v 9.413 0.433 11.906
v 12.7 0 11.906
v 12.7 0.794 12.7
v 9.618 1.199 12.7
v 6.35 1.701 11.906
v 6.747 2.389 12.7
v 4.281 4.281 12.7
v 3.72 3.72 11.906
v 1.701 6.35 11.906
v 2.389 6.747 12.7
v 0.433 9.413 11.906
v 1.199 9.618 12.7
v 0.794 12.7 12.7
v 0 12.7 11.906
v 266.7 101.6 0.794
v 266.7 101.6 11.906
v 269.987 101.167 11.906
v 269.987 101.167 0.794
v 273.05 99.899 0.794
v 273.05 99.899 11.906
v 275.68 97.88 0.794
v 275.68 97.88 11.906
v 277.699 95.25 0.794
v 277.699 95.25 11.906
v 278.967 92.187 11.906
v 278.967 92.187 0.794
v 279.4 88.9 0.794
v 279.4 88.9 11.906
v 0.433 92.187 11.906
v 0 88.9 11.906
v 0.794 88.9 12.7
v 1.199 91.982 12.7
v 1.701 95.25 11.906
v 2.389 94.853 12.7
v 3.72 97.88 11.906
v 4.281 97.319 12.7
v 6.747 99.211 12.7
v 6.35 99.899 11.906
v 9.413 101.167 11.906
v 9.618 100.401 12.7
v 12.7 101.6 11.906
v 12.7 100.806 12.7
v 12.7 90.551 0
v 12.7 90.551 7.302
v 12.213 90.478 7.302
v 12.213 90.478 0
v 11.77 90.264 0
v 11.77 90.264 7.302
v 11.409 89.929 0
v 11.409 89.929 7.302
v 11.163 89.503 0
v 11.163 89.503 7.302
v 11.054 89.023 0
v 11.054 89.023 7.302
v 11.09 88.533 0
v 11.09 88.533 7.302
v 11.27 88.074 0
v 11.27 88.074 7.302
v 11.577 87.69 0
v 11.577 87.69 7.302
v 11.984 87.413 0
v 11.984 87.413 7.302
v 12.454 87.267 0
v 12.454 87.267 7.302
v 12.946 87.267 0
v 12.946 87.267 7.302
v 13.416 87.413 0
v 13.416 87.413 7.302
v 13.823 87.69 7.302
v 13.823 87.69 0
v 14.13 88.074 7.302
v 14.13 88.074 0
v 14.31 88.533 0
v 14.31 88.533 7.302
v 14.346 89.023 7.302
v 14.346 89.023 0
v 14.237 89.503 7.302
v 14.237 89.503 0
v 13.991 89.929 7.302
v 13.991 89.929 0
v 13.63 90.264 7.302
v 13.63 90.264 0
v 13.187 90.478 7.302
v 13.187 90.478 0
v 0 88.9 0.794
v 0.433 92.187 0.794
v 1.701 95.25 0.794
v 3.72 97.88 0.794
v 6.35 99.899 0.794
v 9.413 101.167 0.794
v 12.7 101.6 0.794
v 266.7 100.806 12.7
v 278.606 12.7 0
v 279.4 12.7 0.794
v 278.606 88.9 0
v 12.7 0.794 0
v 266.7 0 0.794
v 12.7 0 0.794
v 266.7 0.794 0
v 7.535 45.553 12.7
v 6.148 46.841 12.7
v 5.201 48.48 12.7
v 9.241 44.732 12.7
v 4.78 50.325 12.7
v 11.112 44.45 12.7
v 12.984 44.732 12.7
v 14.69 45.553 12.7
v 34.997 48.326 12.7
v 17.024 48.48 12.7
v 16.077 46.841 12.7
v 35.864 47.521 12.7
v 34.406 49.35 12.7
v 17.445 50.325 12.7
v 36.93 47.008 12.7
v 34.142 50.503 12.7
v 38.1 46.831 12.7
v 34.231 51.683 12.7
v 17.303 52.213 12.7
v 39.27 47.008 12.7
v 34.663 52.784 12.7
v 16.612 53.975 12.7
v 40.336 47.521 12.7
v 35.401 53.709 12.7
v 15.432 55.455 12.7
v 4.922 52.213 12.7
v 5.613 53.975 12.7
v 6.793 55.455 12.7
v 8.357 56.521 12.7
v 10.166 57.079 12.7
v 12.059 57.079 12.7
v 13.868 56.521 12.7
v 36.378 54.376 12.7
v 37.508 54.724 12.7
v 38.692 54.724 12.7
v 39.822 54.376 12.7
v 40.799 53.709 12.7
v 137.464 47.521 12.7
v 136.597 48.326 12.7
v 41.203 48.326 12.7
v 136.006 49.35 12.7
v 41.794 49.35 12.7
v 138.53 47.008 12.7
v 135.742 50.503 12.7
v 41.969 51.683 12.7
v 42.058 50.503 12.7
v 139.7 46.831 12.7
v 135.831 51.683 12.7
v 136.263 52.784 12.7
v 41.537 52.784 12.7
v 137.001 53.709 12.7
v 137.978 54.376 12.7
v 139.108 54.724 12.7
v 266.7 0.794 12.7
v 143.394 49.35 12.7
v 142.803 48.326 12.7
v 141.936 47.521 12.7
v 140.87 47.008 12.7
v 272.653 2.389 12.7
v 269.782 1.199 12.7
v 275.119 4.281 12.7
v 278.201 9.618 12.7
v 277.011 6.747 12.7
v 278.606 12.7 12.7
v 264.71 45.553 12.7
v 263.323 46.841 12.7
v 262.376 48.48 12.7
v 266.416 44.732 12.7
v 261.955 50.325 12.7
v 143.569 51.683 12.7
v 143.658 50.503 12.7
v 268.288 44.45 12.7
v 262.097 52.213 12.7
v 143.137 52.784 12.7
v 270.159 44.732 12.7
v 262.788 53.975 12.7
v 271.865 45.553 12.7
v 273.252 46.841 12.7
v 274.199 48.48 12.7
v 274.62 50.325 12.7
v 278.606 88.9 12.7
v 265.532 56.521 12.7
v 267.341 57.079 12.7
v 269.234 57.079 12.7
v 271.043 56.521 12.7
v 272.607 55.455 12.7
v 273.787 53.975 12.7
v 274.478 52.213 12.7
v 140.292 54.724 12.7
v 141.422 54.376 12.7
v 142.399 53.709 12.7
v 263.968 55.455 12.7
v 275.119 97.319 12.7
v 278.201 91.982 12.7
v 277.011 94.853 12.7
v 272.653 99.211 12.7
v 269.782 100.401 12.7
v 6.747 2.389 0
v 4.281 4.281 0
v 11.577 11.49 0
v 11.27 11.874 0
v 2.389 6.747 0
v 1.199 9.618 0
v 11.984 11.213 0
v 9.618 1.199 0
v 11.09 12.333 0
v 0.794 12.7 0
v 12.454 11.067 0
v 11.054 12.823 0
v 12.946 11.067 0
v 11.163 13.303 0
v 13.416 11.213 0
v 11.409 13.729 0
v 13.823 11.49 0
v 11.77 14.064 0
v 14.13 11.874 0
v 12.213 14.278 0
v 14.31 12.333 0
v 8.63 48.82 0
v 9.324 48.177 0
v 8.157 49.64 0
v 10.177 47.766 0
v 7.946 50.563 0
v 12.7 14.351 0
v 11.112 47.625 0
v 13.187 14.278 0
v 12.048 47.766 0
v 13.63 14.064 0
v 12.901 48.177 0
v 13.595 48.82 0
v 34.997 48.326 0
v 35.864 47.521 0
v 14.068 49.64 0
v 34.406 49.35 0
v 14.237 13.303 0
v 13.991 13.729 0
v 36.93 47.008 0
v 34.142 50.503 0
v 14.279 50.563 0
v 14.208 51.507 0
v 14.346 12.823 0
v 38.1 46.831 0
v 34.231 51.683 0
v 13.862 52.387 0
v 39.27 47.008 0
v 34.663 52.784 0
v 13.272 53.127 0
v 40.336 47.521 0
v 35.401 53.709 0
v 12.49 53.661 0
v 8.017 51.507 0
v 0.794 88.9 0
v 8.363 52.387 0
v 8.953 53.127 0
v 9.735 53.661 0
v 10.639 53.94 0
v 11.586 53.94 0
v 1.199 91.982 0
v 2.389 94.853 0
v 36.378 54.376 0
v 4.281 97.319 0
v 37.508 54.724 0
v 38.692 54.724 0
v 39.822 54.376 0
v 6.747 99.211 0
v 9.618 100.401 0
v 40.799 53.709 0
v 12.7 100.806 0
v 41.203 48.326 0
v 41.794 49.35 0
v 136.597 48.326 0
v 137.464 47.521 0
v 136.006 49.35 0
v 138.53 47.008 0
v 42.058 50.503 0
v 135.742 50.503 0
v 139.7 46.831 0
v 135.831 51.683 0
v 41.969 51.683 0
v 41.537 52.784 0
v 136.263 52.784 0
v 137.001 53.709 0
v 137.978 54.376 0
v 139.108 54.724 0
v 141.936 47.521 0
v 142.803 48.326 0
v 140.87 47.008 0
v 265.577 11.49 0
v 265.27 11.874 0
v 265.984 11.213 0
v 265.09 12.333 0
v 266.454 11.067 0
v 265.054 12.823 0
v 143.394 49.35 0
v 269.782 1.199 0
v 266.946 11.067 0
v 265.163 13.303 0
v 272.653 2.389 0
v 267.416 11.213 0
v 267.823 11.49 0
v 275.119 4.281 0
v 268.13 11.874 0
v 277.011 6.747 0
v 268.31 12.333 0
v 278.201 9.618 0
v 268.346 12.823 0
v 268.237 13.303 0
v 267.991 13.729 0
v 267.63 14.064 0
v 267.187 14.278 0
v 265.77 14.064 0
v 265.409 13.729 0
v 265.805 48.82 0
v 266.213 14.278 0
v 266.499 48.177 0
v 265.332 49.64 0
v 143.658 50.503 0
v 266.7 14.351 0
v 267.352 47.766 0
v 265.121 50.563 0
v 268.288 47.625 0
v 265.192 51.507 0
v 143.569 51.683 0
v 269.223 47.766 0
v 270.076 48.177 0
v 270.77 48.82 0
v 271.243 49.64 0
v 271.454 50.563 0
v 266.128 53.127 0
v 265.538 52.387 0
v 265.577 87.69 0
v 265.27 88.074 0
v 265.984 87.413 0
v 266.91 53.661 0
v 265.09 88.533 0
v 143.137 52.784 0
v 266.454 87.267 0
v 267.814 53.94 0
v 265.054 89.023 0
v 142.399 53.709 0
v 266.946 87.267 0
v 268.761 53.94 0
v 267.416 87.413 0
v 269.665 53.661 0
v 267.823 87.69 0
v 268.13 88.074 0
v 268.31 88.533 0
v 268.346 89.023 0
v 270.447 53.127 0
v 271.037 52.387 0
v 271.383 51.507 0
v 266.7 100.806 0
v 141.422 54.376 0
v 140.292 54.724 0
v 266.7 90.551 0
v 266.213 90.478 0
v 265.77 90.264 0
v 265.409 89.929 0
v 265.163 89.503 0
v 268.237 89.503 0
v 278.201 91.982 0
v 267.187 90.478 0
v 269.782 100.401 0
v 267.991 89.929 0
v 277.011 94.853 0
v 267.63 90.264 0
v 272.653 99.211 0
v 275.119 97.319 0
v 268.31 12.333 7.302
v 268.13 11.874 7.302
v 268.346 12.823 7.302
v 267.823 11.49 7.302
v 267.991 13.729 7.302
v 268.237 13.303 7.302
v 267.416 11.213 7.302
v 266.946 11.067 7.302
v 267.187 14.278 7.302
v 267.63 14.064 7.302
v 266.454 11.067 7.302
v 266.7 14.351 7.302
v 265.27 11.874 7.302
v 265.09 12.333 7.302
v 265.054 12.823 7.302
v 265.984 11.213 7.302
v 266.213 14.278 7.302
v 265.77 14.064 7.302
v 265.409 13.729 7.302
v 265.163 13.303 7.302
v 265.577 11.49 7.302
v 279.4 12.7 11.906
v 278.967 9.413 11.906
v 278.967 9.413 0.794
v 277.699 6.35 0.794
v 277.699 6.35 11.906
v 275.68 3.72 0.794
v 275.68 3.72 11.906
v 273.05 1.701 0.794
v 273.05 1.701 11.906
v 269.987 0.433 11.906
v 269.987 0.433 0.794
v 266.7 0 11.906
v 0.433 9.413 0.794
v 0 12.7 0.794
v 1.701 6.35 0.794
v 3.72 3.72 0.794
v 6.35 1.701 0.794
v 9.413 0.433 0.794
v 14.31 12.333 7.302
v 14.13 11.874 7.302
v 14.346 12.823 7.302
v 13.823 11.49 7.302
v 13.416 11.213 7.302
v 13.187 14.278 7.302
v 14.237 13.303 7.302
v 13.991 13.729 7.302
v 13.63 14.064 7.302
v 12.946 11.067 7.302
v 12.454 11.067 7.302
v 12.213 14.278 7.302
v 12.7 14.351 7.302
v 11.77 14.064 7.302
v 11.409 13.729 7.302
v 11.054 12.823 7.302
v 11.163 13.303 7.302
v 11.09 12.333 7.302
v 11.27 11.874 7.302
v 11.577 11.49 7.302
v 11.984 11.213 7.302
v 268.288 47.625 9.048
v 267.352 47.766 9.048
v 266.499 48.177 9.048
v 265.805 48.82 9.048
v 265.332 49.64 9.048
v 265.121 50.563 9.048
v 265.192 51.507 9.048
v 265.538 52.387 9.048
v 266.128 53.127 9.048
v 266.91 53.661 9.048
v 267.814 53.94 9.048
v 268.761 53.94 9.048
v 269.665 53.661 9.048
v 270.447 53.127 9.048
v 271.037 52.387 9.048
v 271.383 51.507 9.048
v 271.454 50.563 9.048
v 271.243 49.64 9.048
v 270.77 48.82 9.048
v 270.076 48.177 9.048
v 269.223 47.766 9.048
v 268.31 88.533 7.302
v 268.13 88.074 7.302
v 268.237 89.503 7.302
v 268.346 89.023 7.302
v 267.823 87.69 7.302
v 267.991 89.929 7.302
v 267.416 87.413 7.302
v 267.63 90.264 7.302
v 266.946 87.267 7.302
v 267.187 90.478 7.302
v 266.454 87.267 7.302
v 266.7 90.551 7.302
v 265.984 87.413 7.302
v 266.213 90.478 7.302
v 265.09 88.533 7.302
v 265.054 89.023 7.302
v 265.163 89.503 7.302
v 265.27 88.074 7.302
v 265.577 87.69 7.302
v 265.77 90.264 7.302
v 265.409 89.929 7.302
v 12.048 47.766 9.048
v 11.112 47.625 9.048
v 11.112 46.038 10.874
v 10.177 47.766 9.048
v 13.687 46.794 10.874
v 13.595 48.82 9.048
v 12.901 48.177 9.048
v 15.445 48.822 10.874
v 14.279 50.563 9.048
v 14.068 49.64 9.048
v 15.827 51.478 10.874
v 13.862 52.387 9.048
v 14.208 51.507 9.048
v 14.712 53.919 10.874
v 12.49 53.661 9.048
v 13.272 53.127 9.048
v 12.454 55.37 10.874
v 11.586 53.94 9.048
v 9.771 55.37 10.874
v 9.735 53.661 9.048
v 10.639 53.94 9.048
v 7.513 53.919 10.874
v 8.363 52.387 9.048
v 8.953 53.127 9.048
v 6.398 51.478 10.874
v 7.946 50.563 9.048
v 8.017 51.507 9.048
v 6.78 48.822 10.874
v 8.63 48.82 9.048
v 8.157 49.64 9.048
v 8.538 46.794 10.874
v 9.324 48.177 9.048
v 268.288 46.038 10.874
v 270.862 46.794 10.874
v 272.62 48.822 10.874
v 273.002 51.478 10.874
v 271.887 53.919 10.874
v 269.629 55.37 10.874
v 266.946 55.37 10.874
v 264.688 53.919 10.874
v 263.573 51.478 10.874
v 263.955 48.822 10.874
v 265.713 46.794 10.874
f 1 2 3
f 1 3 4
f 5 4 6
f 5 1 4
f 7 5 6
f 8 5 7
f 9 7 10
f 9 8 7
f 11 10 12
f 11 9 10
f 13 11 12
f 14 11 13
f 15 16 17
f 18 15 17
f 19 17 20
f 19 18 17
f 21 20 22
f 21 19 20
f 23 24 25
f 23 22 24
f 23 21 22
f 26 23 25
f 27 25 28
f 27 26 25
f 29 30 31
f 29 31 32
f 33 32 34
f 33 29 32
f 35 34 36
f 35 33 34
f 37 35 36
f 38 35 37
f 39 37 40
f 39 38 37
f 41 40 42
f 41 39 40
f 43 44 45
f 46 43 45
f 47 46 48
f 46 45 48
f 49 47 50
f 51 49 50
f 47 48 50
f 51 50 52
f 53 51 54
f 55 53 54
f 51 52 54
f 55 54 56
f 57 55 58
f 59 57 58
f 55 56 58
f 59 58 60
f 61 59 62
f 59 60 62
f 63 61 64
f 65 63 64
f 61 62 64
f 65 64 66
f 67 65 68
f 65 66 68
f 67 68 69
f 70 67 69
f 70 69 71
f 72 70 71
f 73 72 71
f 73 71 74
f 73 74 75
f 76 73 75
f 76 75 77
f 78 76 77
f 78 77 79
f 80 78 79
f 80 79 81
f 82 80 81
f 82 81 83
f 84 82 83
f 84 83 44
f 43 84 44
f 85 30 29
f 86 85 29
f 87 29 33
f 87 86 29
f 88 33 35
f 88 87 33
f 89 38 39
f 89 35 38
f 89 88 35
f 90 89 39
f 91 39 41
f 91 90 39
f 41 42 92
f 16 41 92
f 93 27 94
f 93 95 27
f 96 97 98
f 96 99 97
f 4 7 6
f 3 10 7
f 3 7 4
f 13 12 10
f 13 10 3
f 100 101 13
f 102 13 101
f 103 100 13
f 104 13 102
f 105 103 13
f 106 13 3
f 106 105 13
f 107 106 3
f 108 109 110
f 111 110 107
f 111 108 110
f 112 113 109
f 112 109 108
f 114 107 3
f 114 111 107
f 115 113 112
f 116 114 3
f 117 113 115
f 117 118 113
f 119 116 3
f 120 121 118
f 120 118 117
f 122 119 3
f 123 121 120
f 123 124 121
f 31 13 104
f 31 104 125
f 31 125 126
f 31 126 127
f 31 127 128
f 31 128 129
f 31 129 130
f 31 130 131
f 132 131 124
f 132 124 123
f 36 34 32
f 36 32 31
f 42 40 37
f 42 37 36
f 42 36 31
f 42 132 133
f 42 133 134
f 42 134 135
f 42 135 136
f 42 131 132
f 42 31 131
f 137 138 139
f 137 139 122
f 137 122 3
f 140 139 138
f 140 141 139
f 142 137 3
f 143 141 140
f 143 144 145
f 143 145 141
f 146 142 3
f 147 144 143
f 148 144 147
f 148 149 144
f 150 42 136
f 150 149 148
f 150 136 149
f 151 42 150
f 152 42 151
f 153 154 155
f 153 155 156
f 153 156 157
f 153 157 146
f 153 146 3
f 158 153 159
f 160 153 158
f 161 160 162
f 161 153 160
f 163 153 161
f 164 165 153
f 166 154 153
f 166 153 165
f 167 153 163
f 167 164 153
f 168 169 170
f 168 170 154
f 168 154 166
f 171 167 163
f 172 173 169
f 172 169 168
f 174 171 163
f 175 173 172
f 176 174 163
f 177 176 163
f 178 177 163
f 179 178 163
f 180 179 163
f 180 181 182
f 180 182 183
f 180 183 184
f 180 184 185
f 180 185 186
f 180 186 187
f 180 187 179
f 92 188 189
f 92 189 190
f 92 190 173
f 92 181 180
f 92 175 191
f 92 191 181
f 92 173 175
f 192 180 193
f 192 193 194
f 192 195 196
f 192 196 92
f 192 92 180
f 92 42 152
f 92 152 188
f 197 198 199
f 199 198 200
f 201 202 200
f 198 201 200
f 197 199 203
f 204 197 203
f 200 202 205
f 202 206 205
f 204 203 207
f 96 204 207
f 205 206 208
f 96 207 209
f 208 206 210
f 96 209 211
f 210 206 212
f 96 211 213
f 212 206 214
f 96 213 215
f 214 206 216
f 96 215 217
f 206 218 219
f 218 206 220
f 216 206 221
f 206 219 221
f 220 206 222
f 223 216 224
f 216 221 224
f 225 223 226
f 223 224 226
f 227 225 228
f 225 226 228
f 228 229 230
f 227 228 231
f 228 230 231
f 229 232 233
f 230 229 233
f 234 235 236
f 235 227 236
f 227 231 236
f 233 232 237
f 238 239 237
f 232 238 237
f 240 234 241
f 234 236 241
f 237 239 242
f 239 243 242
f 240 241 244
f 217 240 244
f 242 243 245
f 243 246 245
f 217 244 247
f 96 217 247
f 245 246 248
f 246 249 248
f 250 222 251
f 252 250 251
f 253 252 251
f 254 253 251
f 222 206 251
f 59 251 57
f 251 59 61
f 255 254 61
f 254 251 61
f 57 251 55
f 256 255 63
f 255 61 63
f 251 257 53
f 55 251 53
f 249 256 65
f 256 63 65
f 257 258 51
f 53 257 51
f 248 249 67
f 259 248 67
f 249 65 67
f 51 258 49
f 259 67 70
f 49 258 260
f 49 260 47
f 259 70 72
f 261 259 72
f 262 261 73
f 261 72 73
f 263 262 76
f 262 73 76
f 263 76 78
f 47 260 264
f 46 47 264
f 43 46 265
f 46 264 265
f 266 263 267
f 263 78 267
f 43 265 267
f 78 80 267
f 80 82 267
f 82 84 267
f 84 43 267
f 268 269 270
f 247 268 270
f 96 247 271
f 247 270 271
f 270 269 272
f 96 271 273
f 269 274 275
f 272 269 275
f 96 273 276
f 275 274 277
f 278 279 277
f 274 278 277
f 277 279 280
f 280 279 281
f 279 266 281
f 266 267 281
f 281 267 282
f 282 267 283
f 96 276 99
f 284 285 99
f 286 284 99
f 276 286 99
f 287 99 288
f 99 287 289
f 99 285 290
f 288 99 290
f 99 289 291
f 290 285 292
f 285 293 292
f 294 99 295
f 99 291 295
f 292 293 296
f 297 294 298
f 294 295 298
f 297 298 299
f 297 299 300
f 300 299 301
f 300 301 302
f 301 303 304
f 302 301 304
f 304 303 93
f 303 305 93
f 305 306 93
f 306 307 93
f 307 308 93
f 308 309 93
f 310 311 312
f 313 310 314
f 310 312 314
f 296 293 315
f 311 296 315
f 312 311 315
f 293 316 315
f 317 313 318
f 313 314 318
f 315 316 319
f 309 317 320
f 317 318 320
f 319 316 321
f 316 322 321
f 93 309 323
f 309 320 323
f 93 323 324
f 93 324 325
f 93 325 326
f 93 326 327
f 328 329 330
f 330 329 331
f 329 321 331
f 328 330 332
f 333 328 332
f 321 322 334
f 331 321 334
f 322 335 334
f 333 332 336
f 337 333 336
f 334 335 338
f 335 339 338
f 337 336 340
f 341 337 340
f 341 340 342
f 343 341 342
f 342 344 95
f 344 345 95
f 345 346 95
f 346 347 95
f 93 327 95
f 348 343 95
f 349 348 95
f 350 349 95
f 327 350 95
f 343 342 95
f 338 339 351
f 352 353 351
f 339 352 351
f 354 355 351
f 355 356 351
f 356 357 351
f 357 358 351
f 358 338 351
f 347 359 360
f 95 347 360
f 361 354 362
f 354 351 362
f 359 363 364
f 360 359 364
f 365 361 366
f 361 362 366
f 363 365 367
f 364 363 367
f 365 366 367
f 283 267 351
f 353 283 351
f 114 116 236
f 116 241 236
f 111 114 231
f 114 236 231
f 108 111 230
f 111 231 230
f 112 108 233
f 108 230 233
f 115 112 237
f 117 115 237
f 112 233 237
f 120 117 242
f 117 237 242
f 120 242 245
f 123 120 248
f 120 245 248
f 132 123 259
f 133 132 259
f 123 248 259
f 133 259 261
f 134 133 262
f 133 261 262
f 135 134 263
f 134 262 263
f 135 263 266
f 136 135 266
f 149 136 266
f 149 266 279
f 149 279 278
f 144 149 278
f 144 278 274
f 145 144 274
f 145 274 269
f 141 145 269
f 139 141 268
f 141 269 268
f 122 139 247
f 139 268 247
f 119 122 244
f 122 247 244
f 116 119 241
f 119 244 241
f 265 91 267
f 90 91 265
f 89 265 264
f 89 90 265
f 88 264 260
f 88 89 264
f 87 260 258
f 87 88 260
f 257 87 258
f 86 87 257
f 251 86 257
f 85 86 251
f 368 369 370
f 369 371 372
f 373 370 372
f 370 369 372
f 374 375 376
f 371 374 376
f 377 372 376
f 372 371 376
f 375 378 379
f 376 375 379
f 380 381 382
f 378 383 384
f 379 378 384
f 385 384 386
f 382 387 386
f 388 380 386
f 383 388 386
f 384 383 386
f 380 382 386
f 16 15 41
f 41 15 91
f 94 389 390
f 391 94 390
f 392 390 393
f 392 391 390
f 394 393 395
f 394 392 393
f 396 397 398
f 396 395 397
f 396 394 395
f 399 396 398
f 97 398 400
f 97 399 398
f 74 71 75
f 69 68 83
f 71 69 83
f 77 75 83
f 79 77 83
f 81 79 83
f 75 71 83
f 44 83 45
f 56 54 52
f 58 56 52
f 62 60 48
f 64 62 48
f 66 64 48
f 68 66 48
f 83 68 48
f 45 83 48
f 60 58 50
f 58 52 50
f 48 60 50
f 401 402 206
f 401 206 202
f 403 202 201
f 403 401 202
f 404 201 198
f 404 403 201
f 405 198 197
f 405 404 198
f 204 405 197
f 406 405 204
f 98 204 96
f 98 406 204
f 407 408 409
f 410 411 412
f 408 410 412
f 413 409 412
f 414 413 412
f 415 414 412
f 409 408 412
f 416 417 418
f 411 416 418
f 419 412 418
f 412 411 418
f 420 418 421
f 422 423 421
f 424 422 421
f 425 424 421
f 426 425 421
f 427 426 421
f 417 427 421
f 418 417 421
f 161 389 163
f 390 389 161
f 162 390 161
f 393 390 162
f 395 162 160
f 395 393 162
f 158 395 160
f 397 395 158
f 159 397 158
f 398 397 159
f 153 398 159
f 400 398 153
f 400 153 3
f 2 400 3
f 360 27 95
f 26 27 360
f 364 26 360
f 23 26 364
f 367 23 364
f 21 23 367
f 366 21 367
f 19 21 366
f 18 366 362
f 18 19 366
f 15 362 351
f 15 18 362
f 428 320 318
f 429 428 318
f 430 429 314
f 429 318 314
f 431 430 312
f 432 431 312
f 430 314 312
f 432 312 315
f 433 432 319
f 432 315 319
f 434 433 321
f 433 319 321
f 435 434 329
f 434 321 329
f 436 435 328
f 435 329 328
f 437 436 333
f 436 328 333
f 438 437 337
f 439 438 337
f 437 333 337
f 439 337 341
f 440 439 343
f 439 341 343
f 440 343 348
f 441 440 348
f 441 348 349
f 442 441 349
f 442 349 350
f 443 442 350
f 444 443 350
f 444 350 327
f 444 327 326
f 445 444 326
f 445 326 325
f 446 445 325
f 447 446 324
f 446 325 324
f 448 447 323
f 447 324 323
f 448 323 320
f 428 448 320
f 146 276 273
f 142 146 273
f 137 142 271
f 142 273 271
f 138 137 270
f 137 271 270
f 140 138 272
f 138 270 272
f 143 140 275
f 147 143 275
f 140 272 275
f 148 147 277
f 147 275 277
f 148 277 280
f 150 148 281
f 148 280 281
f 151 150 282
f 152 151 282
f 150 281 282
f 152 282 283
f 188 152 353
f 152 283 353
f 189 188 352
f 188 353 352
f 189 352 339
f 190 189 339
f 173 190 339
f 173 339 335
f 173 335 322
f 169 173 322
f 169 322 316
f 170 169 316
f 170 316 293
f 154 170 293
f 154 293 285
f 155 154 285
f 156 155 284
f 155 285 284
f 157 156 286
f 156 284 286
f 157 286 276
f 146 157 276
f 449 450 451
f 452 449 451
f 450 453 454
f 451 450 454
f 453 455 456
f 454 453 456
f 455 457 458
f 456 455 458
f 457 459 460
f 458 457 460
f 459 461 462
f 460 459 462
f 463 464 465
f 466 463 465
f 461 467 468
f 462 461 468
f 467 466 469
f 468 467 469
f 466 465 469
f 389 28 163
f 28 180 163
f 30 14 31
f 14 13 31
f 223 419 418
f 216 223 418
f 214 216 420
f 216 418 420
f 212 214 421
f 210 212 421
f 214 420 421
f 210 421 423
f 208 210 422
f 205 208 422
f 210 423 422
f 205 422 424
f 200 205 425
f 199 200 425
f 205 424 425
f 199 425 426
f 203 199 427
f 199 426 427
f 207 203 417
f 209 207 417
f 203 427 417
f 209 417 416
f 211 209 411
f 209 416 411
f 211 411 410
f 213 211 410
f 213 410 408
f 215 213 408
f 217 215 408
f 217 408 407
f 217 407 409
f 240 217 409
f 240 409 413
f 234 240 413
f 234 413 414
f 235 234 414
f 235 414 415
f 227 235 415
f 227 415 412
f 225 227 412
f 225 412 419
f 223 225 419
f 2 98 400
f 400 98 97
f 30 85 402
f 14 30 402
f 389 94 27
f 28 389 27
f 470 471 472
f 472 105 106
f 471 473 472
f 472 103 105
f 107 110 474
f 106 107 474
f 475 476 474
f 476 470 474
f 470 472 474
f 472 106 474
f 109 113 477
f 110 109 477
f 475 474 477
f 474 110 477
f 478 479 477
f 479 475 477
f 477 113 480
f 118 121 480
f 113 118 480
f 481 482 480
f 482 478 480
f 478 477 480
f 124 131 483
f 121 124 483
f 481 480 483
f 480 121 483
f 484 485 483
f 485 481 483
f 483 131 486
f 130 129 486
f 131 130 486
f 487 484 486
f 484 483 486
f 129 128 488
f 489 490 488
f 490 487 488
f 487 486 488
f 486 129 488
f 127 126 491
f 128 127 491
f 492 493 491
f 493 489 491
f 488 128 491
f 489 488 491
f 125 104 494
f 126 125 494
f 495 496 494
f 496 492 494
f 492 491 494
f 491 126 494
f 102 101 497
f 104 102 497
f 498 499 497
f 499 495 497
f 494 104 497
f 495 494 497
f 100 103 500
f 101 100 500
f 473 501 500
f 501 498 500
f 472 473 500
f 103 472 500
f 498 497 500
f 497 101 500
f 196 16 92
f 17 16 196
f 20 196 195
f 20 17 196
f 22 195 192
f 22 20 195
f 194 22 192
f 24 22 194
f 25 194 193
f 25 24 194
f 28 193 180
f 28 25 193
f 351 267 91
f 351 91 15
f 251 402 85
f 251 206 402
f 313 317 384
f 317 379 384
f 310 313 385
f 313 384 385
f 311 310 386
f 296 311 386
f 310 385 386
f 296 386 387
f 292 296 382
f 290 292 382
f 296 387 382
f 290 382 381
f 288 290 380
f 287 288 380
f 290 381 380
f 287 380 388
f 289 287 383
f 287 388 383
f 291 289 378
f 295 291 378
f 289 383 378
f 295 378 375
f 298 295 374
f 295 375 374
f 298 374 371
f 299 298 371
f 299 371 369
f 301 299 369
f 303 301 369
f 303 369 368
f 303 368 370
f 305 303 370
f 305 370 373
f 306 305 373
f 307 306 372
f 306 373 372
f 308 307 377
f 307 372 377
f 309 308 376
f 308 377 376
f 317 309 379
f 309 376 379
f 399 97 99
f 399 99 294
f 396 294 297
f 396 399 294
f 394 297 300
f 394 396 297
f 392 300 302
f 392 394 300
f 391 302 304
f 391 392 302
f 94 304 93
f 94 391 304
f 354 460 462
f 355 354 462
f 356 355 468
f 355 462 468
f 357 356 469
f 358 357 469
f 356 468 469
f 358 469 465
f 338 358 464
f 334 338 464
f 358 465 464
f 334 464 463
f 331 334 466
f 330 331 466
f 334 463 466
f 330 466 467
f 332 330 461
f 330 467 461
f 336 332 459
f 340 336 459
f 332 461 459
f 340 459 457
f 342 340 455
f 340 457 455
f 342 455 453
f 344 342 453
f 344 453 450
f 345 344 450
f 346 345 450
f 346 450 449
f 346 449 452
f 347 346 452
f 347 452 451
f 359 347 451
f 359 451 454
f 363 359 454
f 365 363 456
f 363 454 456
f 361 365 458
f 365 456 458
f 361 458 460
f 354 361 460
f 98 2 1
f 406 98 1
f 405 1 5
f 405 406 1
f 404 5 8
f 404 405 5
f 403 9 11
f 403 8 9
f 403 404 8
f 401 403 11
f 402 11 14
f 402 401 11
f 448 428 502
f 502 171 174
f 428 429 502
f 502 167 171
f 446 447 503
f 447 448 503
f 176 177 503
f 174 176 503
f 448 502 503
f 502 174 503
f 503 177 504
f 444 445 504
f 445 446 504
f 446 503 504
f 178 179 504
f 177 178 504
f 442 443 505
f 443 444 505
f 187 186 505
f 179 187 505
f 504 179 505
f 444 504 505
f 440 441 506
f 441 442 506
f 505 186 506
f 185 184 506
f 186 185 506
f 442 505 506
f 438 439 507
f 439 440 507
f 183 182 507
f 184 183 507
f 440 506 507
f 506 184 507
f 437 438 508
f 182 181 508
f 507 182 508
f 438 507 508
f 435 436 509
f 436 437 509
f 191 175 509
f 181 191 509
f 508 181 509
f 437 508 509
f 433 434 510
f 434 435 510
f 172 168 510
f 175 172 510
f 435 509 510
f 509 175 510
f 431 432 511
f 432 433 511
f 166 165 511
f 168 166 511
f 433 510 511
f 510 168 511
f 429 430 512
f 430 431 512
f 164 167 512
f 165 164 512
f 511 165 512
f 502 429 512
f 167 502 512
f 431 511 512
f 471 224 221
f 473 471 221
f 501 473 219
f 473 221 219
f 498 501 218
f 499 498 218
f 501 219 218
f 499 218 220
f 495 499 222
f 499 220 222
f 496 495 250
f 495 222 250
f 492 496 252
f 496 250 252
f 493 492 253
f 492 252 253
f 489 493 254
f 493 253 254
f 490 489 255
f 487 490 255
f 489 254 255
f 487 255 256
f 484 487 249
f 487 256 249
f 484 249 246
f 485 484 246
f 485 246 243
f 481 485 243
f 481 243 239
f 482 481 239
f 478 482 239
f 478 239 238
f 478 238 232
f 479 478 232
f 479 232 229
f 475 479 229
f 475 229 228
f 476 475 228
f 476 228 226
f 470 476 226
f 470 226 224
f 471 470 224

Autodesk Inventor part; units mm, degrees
ref_plane "YZ Plane" through (0, 0, 0) normal (1, 0, 0) x (0, 1, 0)
ref_plane "XZ Plane" through (0, 0, 0) normal (0, 1, 0) x (-1, 0, 0)
ref_plane "XY Plane" through (0, 0, 0) normal (0, 0, 1) x (1, 0, 0)
sketch "Sketch1" plane through (0, 0, 0) normal (0, 0, 1) x (1, 0, 0)
  line L0 (12.7, 0) -> (266.7, 0)
  line L1 (279.4, 12.7) -> (279.4, 88.9)
  line L2 (266.7, 101.6) -> (12.7, 101.6)
  line L3 (0, 88.9) -> (0, 12.7)
  arc A0 (12.7, 101.6) -> (0, 88.9) centre (12.7, 88.9) ccw
  arc A1 (0, 12.7) -> (12.7, 0) centre (12.7, 12.7) ccw
  arc A2 (266.7, 0) -> (279.4, 12.7) centre (266.7, 12.7) ccw
  arc A3 (279.4, 88.9) -> (266.7, 101.6) centre (266.7, 88.9) ccw
  point P0 (0, 0)
  point P1 (279.4, 101.6)
  point P2 (279.4, 0)
  point P3 (0, 101.6)
  dimension "d0" = 279.4
  dimension "d1" = 101.6
  dimension "d2" = 12.7
extrude "Extrusion1" add sketch "Sketch1" along normal blind 12.7
chamfer "Chamfer1" distance 0.7937 angle 45 16 edges at (139.7, 101.6, 12.7) (3.7197, 97.8803, 12.7) (0, 50.8, 12.7) (3.7197, 3.7197, 12.7) (139.7, 0, 12.7) (275.6803, 3.7197, 12.7) (279.4, 50.8, 12.7) (275.6803, 97.8803, 12.7) (139.7, 101.6, 0) (3.7197, 97.8803, 0) (0, 50.8, 0) (3.7197, 3.7197, 0) (139.7, 0, 0) (275.6803, 3.7197, 0) (279.4, 50.8, 0) (275.6803, 97.8803, 0)
sketch "Sketch2" plane through (0, 0, 12.7) normal (0, 0, 1) x (1, 0, 0)
  line L0 (0.7937, 12.7) -> (0.7938, 88.9) projected
  line L1 (0, 88.9) -> (0, 12.7) projected
  line L2 (266.7, 101.6) -> (12.7, 101.6) projected
  line L3 (279.4, 12.7) -> (279.4, 88.9) projected
  point P0 (0, 0)
  point P1 (11.1125, 50.8)
  point P2 (38.1, 50.8)
  point P3 (139.7, 50.8)
  point P4 (268.2875, 50.8)
  dimension "d9" = 11.1125
  dimension "d10" = 50.8
  dimension "d11" = 50.8
  dimension "d12" = 50.8
  dimension "d13" = 50.8
  dimension "d14" = 11.1125
  dimension "d15" = 139.7
  dimension "d16" = 38.1
hole "Hole1" at (11.1125, 50.8, 12.7) at (268.2875, 50.8, 12.7) direction (0, 0, -1) diameter 6.35 end through all countersink diameter 12.7 countersink angle 82
hole "Hole2" at (38.1, 50.8, 12.7) at (139.7, 50.8, 12.7) direction (0, 0, -1) diameter 7.9375 end through all
sketch "Sketch3" plane through (0, 0, 0) normal (0, 0, -1) x (-1, 0, 0)
  arc A0 (-12.7, 0.7937) -> (-0.7938, 12.7) centre (-12.7, 12.7) ccw projected
  arc A1 (-0.7938, 88.9) -> (-12.7, 100.8062) centre (-12.7, 88.9) ccw projected
  arc A2 (-266.7, 100.8062) -> (-278.6063, 88.9) centre (-266.7, 88.9) ccw projected
  arc A3 (-278.6063, 12.7) -> (-266.7, 0.7938) centre (-266.7, 12.7) ccw projected
  point P0 (0, 0)
hole "Hole3" at (12.7, 12.7, 0) at (12.7, 88.9, 0) at (266.7, 88.9, 0) at (266.7, 12.7, 0) direction (0, 0, 1) diameter 3.302 depth 7.3025 thread size "8-32 UNC" class "2B" standard "ANSI Unified Screw Threads"
properties part number "Base Plate"
